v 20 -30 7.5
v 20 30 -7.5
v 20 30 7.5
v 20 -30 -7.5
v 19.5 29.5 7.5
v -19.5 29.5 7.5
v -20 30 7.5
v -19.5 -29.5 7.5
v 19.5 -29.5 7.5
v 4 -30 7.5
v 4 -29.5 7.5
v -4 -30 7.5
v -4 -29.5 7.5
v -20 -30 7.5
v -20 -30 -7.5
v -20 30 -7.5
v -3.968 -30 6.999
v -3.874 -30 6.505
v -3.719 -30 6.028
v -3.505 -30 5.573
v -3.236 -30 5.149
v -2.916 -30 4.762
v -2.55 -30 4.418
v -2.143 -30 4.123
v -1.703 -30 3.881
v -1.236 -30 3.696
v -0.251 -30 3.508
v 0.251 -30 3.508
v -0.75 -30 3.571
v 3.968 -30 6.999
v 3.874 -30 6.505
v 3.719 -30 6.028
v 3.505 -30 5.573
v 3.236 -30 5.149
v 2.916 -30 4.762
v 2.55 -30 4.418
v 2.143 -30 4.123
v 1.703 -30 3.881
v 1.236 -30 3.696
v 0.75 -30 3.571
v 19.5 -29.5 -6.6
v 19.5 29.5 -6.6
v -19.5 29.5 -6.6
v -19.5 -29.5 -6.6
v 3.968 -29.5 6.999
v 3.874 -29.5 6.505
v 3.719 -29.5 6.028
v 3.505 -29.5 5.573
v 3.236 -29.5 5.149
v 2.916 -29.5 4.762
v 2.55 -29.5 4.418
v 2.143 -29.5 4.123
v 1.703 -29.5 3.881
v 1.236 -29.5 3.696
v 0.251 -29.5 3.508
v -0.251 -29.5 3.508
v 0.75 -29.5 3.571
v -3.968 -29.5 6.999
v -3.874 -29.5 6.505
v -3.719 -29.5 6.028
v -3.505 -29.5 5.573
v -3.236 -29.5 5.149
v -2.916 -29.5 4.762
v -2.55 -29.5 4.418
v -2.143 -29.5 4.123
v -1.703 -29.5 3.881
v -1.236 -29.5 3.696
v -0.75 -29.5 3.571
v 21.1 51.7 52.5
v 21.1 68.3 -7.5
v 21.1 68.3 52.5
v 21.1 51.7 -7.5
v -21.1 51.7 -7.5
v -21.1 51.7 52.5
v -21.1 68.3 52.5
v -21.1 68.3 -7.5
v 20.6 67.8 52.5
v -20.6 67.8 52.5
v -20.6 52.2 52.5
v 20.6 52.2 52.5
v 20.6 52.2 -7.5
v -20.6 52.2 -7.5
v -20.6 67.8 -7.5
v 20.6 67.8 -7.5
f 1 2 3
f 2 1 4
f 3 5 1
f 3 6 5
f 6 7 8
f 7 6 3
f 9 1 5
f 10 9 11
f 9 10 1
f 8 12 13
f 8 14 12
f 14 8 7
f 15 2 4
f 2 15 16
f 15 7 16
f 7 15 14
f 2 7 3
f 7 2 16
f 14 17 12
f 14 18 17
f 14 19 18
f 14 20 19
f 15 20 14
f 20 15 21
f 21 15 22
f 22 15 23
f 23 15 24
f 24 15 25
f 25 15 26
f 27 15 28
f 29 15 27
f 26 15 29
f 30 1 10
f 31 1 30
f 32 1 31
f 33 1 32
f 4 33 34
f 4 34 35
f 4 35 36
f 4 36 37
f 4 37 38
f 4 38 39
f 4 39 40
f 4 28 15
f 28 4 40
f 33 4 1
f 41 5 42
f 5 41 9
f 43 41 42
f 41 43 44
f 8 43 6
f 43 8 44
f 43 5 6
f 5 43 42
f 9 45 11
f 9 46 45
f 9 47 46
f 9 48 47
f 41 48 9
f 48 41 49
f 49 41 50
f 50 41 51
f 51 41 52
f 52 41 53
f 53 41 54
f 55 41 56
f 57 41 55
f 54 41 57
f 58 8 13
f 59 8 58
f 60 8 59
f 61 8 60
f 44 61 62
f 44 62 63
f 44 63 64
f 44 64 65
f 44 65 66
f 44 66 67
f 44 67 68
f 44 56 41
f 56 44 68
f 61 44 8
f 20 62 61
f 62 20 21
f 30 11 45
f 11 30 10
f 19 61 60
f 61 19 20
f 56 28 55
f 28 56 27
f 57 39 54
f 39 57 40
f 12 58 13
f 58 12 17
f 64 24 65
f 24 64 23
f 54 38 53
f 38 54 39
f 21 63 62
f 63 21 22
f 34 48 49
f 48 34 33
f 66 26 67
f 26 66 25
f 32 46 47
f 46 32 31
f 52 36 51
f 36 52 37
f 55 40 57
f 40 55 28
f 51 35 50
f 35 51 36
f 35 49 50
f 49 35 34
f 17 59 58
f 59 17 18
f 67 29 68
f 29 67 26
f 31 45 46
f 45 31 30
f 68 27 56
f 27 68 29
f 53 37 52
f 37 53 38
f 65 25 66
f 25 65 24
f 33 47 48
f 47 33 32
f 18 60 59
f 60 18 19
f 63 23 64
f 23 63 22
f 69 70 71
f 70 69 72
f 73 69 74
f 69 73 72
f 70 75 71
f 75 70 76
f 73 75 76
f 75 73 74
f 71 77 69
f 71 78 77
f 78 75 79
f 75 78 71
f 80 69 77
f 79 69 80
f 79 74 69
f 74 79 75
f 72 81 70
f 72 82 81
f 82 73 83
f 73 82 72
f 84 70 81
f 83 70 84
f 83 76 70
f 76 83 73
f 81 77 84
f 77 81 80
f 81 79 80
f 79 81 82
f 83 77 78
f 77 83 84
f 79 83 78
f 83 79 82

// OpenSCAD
//Parametric Matchbox Maker
//by Hermes Alvarado
//<hermesalvarado@gmail.com>
//www.facebook.com/MyDigitalDreamland

//Parameters:
width = 40;
length = 60;
height = 15;
thickness = 1;
bottomthickness = .6;
tolerance = 0.6;
resolution = 50; //20: low, 50: mid, 75: high;
useText = false; //true or false;
useDXF = false; //true or false;
customtext = "Hello"; //use quotation marks;
customtextsize = 10;
customDXF = "smile.dxf"; //smile.dxf, clip.dxf, domo.dxf, heart.dxf

//Gererators:
module boxhole(){
    translate([0,0,height/2]){
        rotate([90,0,0]){
            cylinder($fn=resolution,h=length/2,r=width/10,center=false);
        }
    }
}
module matchbox(){
    difference(){
        cube([width,length,height],true);
        translate([0,0,bottomthickness]){
            cube([width-thickness, length-thickness,height-bottomthickness], true);
        }
        boxhole();
    }
}
module customtext(){
    translate([0,0,height/2+thickness/2]){
        linear_extrude(thickness*2,center=true,convexity=10){
            $fn=resolution;
            text(customtext,customtextsize,font="Liberation:style=Bold",halign="center",valign="center");
        }
    }
}
module customDXF(){
    translate([0,0,height/2+thickness/2]){
        linear_extrude(thickness*2,center=true,convexity=10){
            $fn=resolution;
            import(file=customDXF);
        }
    }
}
module sleeve(){
    translate([0,length,length/2-height/2]){
        rotate([90,0,0]){
            difference(){
                cube([width+thickness+tolerance*2,length,height+thickness+tolerance],true);
                cube([width+tolerance*2,length+thickness+tolerance,height+tolerance],true);
                if(useDXF==true){
                    customDXF();
                }
                if(useText==true){
                   customtext();
                } 
            }
        }
    }
}
matchbox();
sleeve();
